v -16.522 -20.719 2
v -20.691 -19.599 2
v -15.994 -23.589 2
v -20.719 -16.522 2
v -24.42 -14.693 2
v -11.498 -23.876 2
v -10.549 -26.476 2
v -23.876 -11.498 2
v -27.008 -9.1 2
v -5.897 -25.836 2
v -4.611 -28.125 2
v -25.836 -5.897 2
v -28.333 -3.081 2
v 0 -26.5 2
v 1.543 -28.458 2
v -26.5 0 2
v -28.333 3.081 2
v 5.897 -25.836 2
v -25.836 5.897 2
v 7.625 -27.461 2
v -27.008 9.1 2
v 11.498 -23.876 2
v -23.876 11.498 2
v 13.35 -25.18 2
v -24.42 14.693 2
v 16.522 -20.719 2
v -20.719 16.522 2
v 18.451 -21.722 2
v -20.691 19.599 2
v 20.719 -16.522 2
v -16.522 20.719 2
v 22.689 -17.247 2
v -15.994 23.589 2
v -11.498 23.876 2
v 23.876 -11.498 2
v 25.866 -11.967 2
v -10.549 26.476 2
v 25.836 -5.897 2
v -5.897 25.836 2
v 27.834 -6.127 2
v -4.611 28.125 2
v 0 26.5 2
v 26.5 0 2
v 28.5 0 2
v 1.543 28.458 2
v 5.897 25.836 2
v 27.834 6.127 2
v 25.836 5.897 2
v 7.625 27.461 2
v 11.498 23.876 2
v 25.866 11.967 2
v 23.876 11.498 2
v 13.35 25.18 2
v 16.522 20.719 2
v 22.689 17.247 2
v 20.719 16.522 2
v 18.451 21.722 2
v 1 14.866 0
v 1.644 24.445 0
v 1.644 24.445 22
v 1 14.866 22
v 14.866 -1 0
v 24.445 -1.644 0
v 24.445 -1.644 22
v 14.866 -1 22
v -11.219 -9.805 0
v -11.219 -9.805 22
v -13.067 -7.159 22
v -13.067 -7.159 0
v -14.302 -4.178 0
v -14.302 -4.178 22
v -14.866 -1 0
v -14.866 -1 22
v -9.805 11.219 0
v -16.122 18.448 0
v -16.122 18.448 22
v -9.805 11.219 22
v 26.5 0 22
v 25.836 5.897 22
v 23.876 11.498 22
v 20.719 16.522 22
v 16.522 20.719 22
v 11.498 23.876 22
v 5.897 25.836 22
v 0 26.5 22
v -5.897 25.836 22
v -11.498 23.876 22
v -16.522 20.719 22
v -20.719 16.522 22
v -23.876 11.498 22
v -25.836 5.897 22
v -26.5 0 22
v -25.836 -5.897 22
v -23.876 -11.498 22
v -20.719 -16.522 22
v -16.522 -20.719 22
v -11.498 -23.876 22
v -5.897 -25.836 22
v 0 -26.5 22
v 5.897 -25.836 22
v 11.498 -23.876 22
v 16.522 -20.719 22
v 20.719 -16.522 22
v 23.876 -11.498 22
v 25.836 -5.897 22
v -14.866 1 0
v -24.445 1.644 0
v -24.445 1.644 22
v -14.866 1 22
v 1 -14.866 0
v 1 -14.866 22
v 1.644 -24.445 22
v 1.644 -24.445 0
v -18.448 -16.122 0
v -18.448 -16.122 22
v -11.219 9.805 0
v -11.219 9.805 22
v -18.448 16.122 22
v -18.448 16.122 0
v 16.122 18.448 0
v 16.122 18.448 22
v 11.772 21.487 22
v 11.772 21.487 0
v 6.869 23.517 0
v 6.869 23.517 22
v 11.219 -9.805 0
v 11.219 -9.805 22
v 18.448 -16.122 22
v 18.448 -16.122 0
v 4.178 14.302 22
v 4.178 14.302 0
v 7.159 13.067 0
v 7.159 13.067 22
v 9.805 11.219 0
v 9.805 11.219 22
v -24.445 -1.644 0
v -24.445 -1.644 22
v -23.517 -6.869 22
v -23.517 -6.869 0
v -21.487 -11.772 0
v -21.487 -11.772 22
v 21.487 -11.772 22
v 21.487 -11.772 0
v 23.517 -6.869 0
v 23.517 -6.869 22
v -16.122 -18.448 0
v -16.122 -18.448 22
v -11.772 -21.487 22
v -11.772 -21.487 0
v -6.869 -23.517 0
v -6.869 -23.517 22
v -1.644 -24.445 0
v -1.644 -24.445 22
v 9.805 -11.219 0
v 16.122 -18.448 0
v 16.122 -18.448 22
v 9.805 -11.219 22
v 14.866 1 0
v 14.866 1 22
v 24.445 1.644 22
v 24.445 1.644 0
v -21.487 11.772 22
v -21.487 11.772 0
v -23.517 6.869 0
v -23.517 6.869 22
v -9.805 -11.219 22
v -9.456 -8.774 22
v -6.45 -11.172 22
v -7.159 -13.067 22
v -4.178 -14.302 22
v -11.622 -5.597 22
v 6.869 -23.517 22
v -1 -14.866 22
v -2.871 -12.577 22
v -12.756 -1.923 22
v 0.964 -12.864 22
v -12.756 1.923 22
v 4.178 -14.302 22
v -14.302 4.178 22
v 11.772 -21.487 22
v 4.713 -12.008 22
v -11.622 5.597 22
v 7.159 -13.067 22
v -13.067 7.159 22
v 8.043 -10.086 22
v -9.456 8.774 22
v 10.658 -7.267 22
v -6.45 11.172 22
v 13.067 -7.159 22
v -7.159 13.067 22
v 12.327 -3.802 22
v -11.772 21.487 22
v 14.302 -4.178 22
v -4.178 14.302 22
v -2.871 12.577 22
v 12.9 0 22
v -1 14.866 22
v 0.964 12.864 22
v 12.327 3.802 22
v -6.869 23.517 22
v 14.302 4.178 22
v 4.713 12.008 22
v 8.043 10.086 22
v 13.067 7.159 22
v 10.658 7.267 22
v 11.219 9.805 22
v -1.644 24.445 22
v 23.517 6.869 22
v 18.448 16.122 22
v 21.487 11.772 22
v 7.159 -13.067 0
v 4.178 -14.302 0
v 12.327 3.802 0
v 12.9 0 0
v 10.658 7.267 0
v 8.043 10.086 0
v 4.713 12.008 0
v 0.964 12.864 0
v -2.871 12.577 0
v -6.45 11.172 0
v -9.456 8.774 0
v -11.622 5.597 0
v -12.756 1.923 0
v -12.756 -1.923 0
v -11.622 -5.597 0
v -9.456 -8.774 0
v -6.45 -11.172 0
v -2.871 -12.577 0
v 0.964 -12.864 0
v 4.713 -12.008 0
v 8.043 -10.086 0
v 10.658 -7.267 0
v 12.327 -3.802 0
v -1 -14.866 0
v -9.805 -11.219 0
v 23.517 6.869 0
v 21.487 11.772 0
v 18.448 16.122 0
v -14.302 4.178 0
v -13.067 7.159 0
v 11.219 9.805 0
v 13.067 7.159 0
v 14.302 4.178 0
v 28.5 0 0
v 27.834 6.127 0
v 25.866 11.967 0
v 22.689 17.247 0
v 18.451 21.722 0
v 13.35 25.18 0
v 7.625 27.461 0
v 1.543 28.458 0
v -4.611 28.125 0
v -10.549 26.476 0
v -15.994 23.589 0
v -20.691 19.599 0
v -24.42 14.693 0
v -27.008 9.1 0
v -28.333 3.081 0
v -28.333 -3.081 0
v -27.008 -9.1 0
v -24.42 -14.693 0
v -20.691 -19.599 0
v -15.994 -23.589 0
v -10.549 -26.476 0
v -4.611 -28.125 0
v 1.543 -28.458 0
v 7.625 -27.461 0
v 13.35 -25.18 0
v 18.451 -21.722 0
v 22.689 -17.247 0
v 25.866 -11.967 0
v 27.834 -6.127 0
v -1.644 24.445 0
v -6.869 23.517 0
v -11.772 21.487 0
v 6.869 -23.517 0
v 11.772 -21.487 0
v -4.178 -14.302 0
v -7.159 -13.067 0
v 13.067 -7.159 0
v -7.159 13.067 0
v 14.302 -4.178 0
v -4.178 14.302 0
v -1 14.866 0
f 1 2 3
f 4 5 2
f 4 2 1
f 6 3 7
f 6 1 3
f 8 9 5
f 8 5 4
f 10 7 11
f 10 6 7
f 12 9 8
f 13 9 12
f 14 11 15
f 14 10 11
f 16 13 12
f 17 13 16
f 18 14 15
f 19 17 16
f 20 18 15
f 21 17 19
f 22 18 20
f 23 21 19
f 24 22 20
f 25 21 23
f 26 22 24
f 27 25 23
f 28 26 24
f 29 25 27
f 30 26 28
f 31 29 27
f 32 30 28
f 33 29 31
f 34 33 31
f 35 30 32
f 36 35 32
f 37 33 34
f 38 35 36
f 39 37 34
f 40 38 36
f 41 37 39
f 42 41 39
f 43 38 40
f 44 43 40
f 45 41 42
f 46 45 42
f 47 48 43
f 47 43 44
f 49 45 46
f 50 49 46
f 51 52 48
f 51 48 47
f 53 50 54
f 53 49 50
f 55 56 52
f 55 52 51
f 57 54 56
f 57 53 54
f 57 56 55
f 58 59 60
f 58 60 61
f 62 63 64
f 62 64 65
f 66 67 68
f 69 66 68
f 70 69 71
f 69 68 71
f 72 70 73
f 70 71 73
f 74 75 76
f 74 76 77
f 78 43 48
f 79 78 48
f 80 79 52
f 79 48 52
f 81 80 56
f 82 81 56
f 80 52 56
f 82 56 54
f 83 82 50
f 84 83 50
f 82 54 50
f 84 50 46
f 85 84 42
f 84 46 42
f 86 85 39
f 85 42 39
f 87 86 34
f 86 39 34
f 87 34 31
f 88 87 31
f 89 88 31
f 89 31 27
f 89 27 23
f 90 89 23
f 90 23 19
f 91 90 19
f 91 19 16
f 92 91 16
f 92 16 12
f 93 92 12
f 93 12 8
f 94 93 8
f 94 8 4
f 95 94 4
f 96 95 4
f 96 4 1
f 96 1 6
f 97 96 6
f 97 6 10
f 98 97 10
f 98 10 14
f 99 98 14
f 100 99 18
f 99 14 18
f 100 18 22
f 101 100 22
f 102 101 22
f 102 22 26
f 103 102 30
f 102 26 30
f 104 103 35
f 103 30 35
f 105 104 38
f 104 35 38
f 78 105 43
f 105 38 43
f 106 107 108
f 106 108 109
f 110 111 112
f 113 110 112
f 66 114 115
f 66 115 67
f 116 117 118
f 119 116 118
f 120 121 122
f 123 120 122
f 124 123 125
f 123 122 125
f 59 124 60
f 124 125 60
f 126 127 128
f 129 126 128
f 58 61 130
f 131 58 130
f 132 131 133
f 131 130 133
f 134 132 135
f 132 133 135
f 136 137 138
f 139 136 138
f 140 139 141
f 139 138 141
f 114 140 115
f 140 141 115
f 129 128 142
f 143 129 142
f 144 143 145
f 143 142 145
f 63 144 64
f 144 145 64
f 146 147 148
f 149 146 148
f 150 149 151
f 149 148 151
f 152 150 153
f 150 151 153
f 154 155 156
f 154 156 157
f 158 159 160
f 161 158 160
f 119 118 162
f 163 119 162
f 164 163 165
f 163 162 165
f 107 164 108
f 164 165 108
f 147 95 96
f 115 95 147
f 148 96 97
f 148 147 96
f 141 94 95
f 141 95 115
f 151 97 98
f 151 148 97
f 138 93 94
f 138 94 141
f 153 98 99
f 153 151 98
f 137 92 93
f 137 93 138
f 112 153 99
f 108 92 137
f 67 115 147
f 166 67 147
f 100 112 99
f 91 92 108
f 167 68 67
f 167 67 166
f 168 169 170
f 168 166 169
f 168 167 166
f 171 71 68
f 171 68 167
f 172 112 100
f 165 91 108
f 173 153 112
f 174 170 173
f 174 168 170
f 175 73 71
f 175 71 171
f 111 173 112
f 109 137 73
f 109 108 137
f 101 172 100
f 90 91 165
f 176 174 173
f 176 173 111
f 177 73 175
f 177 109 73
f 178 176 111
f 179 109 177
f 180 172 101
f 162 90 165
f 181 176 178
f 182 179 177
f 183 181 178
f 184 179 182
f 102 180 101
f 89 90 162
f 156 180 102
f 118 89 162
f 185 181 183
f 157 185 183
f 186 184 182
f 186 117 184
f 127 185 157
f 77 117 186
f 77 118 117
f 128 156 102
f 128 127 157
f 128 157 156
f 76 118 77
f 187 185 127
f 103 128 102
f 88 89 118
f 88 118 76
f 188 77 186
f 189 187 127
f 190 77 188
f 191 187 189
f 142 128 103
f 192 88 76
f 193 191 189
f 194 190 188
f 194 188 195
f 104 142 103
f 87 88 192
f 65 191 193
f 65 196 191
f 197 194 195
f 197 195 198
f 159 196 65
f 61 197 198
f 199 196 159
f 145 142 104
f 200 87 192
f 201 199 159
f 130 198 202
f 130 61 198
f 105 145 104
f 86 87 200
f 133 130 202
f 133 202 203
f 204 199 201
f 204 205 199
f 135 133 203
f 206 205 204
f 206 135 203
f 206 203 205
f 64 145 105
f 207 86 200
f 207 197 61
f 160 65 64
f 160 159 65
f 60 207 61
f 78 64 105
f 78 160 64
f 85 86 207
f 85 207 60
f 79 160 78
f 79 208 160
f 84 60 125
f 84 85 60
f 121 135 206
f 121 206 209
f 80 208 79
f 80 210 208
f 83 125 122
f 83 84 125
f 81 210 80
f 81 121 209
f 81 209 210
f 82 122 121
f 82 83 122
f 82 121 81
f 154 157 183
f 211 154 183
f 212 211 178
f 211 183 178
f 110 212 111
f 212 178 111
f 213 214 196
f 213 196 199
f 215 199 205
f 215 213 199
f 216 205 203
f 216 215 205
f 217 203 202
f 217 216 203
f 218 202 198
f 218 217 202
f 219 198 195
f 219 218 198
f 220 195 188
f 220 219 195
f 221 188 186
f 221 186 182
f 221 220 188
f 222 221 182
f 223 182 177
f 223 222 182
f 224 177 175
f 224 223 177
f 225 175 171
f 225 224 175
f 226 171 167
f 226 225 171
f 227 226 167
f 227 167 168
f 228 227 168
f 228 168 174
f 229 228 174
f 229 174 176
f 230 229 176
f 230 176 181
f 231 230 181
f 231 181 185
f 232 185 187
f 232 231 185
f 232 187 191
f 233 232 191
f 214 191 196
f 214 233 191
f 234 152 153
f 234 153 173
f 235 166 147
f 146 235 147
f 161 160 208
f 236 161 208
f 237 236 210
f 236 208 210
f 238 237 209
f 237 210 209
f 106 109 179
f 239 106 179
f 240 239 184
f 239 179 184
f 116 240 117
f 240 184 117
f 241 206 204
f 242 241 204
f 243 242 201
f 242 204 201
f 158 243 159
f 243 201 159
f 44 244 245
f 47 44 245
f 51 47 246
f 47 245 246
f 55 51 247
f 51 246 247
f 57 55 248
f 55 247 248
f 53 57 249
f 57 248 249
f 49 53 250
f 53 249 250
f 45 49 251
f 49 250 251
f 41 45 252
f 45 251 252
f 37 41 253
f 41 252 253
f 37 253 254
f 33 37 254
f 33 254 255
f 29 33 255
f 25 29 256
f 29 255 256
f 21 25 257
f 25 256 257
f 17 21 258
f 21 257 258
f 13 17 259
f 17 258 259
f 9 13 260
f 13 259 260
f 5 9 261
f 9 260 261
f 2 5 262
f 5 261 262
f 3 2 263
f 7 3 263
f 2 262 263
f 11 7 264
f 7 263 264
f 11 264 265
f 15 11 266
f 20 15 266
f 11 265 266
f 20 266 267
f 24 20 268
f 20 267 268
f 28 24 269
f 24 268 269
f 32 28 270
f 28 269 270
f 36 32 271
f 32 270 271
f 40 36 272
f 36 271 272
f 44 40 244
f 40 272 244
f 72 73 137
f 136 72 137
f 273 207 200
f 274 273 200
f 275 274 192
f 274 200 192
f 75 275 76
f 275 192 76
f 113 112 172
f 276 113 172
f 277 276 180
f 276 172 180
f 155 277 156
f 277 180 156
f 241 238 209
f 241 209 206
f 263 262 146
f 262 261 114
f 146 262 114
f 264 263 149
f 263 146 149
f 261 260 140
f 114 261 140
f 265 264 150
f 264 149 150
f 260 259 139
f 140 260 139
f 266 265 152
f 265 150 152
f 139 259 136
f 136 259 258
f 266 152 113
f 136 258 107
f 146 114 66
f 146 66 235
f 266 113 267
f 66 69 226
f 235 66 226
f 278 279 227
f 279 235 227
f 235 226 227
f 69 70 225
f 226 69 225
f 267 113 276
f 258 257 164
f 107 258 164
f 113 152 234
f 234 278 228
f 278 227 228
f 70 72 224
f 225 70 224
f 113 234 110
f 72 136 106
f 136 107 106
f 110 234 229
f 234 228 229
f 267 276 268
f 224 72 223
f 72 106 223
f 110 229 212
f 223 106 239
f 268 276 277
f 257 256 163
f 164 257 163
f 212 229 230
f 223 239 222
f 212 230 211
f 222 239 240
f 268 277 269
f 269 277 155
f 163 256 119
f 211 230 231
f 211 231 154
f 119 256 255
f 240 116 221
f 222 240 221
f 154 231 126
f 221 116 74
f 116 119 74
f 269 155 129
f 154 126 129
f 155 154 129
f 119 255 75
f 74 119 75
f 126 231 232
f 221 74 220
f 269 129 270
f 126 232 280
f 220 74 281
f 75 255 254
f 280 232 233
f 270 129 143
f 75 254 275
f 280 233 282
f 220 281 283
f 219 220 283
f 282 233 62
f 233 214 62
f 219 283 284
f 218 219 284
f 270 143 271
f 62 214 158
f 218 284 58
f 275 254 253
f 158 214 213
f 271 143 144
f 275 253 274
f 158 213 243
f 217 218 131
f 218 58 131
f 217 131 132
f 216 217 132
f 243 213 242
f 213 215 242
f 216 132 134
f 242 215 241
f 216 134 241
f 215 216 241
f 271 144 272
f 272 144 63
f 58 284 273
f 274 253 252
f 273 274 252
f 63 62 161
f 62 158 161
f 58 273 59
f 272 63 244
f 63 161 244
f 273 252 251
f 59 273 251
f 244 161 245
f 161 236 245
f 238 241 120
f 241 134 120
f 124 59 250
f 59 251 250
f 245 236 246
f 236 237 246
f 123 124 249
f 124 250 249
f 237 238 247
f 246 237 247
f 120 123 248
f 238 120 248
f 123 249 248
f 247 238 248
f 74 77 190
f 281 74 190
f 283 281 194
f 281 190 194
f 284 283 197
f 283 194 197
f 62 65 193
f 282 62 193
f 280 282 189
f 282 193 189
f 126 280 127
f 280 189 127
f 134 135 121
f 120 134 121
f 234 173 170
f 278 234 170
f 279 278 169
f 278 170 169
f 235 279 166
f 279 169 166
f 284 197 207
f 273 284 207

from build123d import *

# Parameters (mm, degrees)
F0_R     = 26.5
F0_R_2   = 12.9
F1_DEPTH = 22
F0_R_3   = 28.5
F2_DEPTH = 2
F4_DEPTH = 22
F5_COUNT = 8


with BuildPart() as f1:
    # F0 (on Top) → F1 (new body)
    with BuildSketch(Plane.XY):
        Circle(F0_R)
        Circle(F0_R_2, mode=Mode.SUBTRACT)
    extrude(amount=F1_DEPTH)

    # F0 (on Top) → F2 (join)
    with BuildSketch(Plane.XY):
        Circle(F0_R_3)
        Circle(F0_R, mode=Mode.SUBTRACT)
    extrude(amount=F2_DEPTH)


with BuildPart() as f4:
    # F3 (on face) → F4 (new body, through all)
    with BuildSketch(Plane.XY.offset(22)):
        with BuildLine():
            ThreePointArc((1.644295, -24.44476), (9.375744, -22.635049), (16.122363, -18.447748))
            Line((16.122363, -18.447748), (9.805029, -11.219243))
            ThreePointArc((9.805029, -11.219243), (5.701983, -13.765805), (1, -14.866405))
            Line((1, -14.866405), (1.644295, -24.44476))
        make_face()
    extrude(amount=-F4_DEPTH)


with BuildPart() as f5_1:
    # F5: instance of F4
    add(f4.part.rotate(Axis((0, 0, 0), (0, 0, -1)), 1 * 360 / F5_COUNT))


with BuildPart() as f5_2:
    # F5: instance of F4
    add(f4.part.rotate(Axis((0, 0, 0), (0, 0, -1)), 2 * 360 / F5_COUNT))


with BuildPart() as f5_3:
    # F5: instance of F4
    add(f4.part.rotate(Axis((0, 0, 0), (0, 0, -1)), 3 * 360 / F5_COUNT))


with BuildPart() as f5_4:
    # F5: instance of F4
    add(f4.part.rotate(Axis((0, 0, 0), (0, 0, -1)), 4 * 360 / F5_COUNT))


with BuildPart() as f5_5:
    # F5: instance of F4
    add(f4.part.rotate(Axis((0, 0, 0), (0, 0, -1)), 5 * 360 / F5_COUNT))


with BuildPart() as f5_6:
    # F5: instance of F4
    add(f4.part.rotate(Axis((0, 0, 0), (0, 0, -1)), 6 * 360 / F5_COUNT))


with BuildPart() as f5_7:
    # F5: instance of F4
    add(f4.part.rotate(Axis((0, 0, 0), (0, 0, -1)), 7 * 360 / F5_COUNT))


with BuildPart() as f1_1:
    add(f1.part)

    # F6: cut F4, F5_7, F5_6, F5_5, F5_4, F5_3, F5_2, F5_1
    add(f4.part, mode=Mode.SUBTRACT)
    add(f5_7.part, mode=Mode.SUBTRACT)
    add(f5_6.part, mode=Mode.SUBTRACT)
    add(f5_5.part, mode=Mode.SUBTRACT)
    add(f5_4.part, mode=Mode.SUBTRACT)
    add(f5_3.part, mode=Mode.SUBTRACT)
    add(f5_2.part, mode=Mode.SUBTRACT)
    add(f5_1.part, mode=Mode.SUBTRACT)


solid = f1_1.part
